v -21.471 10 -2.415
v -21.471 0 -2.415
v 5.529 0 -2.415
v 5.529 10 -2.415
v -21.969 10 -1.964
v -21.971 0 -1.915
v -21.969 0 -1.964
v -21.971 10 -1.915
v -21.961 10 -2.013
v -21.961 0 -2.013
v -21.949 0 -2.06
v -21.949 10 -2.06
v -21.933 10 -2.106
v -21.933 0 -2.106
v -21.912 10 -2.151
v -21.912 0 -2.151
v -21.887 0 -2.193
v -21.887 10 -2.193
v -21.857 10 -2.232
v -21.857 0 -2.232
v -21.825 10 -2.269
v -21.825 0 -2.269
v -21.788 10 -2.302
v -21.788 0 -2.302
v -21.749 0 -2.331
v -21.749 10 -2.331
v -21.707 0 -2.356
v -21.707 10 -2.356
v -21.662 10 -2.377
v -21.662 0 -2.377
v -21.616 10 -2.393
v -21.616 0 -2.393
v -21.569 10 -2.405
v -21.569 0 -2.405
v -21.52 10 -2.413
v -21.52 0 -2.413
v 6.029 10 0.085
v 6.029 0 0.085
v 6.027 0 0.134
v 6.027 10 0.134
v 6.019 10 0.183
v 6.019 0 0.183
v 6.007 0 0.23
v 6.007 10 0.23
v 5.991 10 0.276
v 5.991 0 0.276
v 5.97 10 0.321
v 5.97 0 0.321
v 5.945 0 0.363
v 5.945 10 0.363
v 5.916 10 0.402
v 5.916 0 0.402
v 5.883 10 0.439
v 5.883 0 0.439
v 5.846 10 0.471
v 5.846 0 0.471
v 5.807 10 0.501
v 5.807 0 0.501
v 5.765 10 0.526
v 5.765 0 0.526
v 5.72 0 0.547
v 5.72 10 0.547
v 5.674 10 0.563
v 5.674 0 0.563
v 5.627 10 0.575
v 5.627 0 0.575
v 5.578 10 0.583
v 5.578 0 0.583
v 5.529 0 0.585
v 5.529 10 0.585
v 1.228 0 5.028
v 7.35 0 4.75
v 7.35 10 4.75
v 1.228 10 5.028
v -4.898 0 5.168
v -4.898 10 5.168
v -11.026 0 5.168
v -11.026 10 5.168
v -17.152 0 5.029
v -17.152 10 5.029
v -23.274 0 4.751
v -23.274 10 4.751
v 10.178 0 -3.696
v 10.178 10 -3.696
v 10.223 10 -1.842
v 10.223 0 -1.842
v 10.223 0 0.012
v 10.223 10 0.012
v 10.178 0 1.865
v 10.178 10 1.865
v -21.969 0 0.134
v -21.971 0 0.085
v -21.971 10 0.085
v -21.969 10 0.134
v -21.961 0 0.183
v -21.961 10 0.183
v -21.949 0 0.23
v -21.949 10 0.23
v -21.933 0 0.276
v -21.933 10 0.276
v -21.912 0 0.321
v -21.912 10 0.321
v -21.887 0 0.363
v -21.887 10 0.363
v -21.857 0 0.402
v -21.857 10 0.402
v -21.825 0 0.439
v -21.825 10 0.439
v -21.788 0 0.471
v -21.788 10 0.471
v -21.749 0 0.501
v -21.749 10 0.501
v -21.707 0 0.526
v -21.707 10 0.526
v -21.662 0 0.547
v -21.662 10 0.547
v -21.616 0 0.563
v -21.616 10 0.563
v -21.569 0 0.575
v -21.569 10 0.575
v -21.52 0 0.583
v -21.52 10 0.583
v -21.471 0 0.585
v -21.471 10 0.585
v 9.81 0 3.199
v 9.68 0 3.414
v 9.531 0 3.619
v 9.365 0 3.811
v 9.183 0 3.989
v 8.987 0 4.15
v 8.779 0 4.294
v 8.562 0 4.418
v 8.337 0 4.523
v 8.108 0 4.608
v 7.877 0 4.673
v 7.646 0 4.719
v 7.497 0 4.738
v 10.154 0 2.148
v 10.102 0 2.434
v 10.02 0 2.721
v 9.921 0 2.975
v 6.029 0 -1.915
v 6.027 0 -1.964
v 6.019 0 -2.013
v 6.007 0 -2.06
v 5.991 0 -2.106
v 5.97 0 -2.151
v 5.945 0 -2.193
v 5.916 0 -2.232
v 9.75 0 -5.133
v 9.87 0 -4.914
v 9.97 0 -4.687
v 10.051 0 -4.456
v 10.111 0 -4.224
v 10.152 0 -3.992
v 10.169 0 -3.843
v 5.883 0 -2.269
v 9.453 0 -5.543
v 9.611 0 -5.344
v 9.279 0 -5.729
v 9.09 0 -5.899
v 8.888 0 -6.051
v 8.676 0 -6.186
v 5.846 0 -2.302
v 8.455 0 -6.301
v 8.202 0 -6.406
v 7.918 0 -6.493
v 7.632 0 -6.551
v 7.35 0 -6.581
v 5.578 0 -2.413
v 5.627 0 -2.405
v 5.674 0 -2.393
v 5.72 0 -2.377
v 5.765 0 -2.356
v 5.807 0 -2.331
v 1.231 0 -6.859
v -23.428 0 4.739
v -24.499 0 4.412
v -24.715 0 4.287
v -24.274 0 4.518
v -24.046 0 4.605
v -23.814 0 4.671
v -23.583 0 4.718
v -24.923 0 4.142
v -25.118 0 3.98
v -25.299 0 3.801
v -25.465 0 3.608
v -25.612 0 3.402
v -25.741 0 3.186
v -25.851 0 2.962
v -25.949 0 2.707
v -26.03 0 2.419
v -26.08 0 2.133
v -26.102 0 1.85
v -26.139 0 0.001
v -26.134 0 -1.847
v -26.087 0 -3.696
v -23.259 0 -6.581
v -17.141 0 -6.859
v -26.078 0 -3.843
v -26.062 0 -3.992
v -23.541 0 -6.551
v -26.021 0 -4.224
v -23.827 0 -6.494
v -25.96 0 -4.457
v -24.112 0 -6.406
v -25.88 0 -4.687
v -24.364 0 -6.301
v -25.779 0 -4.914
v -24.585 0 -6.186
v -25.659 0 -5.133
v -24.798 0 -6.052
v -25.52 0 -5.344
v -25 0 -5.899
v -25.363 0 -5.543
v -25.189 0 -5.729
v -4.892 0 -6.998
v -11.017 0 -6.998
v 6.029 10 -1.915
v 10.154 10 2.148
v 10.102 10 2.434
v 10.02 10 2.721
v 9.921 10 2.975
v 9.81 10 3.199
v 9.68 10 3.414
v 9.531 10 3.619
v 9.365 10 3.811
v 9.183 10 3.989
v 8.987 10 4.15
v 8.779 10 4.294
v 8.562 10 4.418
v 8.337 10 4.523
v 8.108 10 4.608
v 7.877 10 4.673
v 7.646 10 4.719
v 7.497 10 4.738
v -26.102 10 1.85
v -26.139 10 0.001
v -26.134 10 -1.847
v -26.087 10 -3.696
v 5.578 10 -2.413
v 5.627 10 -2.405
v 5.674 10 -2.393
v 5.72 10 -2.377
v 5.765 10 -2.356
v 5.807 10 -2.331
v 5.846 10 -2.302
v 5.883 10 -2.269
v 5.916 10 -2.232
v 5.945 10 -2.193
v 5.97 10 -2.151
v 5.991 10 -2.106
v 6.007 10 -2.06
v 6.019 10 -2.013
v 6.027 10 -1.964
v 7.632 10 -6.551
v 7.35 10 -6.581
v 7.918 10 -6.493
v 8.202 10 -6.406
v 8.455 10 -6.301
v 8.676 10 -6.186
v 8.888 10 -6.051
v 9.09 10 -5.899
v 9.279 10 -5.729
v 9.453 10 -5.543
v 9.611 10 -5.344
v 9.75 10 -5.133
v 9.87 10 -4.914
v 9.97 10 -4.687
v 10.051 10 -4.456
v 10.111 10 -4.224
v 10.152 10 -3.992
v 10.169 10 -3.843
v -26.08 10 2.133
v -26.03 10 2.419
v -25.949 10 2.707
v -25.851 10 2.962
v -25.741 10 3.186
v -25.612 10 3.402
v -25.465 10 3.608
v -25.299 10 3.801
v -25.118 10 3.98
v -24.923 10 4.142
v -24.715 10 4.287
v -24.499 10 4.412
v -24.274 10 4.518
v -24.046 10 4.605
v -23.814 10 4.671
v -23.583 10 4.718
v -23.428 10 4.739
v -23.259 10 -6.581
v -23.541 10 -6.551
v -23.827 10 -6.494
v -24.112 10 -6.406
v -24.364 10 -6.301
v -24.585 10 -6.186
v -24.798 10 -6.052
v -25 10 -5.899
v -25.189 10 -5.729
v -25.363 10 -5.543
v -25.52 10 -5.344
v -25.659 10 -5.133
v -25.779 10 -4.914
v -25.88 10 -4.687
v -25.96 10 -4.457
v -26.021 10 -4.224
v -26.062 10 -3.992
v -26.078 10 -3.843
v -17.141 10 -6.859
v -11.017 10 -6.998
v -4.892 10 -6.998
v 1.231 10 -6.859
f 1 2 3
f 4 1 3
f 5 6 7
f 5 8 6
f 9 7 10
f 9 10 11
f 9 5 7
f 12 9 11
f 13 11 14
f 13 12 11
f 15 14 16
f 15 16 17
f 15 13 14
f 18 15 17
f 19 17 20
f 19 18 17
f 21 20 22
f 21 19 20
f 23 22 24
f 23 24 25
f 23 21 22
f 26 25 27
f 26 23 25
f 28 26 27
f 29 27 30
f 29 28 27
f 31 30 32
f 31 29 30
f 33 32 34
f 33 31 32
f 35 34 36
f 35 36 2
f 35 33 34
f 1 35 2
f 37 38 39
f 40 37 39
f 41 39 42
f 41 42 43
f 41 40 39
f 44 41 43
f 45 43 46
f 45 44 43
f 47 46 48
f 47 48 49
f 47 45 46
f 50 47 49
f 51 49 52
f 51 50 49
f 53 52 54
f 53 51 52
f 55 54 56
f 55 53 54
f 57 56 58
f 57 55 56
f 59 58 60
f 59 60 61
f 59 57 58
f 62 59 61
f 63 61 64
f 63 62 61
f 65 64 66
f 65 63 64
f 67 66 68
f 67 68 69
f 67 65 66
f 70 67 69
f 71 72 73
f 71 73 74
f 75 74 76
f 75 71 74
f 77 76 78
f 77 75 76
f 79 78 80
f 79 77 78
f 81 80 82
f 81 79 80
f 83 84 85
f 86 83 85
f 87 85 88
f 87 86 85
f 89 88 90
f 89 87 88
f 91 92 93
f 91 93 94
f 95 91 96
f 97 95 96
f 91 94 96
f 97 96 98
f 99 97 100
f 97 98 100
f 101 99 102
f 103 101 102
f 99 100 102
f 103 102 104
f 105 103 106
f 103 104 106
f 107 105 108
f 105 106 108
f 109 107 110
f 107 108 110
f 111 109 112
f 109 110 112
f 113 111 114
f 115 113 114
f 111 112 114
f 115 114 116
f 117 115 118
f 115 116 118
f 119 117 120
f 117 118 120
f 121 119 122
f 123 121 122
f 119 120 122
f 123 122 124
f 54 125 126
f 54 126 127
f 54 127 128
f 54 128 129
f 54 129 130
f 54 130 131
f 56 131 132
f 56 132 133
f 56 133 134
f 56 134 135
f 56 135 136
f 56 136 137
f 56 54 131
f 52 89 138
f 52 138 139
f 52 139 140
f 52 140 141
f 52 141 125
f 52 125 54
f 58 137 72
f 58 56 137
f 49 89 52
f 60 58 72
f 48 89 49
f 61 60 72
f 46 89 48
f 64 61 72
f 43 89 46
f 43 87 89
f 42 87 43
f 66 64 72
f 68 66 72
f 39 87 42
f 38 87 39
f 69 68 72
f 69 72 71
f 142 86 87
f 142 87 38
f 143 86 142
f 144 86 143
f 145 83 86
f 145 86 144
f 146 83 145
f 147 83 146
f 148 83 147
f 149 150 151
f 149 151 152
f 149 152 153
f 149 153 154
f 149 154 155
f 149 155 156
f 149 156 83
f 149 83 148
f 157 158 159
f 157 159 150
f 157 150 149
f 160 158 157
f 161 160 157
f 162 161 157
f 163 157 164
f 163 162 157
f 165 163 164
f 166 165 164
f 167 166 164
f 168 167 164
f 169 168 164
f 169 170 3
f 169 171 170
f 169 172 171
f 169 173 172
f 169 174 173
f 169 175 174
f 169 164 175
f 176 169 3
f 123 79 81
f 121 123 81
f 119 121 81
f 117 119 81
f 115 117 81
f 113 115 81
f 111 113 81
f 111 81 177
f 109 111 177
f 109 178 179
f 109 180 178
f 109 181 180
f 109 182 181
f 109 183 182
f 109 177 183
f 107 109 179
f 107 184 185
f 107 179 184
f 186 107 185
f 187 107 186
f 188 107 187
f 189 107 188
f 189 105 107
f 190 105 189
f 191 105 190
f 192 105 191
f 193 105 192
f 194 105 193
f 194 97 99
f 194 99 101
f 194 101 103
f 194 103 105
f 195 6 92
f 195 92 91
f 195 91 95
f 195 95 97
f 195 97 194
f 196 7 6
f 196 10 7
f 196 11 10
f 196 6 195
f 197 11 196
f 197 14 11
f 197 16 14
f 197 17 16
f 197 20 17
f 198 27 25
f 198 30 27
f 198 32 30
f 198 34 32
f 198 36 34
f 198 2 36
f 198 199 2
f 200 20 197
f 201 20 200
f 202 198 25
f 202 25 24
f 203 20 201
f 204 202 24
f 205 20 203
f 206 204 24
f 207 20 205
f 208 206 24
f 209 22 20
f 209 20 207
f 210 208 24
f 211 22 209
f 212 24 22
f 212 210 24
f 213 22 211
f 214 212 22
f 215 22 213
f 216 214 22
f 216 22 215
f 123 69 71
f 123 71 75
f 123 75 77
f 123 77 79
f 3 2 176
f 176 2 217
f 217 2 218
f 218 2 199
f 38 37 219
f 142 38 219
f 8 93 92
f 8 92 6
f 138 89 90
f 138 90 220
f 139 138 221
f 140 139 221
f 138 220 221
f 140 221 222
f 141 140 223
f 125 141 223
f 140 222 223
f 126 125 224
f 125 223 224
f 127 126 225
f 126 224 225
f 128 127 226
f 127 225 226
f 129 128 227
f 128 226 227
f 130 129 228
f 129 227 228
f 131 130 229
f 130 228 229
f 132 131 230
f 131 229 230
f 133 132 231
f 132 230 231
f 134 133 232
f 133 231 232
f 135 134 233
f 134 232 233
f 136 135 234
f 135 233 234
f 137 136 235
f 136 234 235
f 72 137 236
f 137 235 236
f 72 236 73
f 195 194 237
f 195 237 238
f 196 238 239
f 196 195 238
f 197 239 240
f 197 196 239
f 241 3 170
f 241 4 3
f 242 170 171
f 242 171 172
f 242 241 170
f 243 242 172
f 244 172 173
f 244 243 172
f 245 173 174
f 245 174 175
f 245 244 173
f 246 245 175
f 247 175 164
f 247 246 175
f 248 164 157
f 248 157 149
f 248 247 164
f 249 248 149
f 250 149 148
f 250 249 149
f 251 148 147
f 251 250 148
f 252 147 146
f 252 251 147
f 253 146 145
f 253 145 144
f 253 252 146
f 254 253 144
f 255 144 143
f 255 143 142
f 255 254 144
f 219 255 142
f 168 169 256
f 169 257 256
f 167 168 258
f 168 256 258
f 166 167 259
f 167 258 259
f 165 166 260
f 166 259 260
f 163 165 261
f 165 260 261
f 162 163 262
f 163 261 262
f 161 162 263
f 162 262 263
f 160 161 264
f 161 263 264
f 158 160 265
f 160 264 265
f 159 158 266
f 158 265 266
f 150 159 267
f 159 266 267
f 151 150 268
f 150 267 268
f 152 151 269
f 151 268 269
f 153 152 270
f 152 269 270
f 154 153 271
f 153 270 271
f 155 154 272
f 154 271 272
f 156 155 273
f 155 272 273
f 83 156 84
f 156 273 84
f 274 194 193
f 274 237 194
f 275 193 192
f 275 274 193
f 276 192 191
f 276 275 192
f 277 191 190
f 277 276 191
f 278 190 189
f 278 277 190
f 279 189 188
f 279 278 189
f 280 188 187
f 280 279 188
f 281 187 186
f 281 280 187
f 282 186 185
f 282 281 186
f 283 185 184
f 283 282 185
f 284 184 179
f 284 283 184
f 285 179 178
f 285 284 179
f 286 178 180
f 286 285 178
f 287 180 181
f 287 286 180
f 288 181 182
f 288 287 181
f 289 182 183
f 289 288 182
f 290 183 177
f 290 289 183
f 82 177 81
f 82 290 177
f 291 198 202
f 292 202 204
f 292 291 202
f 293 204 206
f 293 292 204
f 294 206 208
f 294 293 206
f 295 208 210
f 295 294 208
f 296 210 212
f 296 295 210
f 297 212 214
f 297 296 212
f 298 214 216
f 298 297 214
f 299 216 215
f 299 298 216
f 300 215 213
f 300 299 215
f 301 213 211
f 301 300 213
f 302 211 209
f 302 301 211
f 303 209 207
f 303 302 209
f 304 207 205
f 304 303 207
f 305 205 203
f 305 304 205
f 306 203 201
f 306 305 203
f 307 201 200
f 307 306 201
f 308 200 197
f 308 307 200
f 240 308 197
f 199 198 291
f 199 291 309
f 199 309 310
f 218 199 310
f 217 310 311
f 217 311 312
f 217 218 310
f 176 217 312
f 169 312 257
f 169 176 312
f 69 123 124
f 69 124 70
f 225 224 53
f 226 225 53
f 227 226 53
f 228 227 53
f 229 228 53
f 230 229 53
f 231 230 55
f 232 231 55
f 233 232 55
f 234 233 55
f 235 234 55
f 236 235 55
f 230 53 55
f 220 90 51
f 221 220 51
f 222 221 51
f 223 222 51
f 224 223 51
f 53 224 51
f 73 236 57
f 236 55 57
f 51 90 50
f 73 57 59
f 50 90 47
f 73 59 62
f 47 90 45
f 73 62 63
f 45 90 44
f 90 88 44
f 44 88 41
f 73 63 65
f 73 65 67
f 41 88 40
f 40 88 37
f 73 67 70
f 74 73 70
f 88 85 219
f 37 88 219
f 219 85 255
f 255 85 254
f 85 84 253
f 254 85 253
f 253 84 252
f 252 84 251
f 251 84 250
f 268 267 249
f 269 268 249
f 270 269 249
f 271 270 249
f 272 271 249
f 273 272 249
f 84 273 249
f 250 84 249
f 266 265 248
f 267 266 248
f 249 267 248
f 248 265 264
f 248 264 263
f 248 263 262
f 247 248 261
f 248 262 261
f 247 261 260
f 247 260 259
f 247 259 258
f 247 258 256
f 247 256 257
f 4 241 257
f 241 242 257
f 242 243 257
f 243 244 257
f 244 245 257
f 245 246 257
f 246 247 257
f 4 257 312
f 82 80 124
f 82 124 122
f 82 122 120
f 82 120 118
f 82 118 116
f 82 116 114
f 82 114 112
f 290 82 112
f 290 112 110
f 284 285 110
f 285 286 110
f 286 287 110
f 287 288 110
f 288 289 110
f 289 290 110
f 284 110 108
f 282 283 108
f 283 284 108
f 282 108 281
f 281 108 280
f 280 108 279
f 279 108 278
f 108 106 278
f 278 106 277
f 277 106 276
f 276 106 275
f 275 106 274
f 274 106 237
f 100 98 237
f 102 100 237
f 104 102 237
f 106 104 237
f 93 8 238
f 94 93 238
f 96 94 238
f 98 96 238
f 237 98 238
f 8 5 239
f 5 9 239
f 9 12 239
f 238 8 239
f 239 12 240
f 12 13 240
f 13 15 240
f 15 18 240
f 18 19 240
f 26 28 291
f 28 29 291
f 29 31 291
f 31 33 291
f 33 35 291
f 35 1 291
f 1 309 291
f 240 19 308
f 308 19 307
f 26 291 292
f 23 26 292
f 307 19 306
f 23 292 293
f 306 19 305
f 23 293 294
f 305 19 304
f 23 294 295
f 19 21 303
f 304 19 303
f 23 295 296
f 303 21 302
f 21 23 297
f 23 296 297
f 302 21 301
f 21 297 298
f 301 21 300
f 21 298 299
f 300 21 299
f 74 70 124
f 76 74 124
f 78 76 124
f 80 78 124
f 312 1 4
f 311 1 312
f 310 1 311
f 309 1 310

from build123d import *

# Parameters (mm, degrees)
SKETCH_1_W      = 28
SKETCH_1_H      = 3
EXTRUDE_1_DEPTH = 10
FILLET_1_R      = 3
FILLET_2_R      = 0.5


with BuildPart() as part:
    # Эскиз1 → Бобышка-Вытянуть1 (new body)
    with BuildSketch(Plane(origin=(0, 0, 0), x_dir=(1, 0, 0), z_dir=(0, 1, 0))):
        with BuildLine():
            ThreePointArc((-25.941942596, 6.415014515), (-7.956456947, 7.015014515), (10.029028702, 6.415014515))
            ThreePointArc((10.029028702, 6.415014515), (10.229028702, 0.915014515), (10.029028702, -4.584985485))
            ThreePointArc((10.029028702, -4.584985485), (-7.970971298, -5.184985485), (-25.970971298, -4.584985485))
            ThreePointArc((-25.970971298, -4.584985485), (-26.141942596, 0.915504007), (-25.941942596, 6.415014515))
        make_face()
        with Locations((-7.970971298, 0.915014515)):
            Rectangle(SKETCH_1_W, SKETCH_1_H, mode=Mode.SUBTRACT)
    extrude(amount=EXTRUDE_1_DEPTH)

    # Скругление1
    fillet_1_edges = [part.edges().sort_by_distance(p)[0] for p in [
        (-25.941942596, 5, -6.415014515),
        (10.029028702, 5, -6.415014515),
        (10.029028702, 5, 4.584985485),
        (-25.970971298, 5, 4.584985485),
    ]]
    fillet(fillet_1_edges, radius=FILLET_1_R)

    # Скругление2
    fillet_2_edges = [part.edges().sort_by_distance(p)[0] for p in [
        (-21.970971298, 5, -2.415014515),
        (-21.970971298, 5, 0.584985485),
        (6.029028702, 5, 0.584985485),
        (6.029028702, 5, -2.415014515),
    ]]
    fillet(fillet_2_edges, radius=FILLET_2_R)


solid = part.part
